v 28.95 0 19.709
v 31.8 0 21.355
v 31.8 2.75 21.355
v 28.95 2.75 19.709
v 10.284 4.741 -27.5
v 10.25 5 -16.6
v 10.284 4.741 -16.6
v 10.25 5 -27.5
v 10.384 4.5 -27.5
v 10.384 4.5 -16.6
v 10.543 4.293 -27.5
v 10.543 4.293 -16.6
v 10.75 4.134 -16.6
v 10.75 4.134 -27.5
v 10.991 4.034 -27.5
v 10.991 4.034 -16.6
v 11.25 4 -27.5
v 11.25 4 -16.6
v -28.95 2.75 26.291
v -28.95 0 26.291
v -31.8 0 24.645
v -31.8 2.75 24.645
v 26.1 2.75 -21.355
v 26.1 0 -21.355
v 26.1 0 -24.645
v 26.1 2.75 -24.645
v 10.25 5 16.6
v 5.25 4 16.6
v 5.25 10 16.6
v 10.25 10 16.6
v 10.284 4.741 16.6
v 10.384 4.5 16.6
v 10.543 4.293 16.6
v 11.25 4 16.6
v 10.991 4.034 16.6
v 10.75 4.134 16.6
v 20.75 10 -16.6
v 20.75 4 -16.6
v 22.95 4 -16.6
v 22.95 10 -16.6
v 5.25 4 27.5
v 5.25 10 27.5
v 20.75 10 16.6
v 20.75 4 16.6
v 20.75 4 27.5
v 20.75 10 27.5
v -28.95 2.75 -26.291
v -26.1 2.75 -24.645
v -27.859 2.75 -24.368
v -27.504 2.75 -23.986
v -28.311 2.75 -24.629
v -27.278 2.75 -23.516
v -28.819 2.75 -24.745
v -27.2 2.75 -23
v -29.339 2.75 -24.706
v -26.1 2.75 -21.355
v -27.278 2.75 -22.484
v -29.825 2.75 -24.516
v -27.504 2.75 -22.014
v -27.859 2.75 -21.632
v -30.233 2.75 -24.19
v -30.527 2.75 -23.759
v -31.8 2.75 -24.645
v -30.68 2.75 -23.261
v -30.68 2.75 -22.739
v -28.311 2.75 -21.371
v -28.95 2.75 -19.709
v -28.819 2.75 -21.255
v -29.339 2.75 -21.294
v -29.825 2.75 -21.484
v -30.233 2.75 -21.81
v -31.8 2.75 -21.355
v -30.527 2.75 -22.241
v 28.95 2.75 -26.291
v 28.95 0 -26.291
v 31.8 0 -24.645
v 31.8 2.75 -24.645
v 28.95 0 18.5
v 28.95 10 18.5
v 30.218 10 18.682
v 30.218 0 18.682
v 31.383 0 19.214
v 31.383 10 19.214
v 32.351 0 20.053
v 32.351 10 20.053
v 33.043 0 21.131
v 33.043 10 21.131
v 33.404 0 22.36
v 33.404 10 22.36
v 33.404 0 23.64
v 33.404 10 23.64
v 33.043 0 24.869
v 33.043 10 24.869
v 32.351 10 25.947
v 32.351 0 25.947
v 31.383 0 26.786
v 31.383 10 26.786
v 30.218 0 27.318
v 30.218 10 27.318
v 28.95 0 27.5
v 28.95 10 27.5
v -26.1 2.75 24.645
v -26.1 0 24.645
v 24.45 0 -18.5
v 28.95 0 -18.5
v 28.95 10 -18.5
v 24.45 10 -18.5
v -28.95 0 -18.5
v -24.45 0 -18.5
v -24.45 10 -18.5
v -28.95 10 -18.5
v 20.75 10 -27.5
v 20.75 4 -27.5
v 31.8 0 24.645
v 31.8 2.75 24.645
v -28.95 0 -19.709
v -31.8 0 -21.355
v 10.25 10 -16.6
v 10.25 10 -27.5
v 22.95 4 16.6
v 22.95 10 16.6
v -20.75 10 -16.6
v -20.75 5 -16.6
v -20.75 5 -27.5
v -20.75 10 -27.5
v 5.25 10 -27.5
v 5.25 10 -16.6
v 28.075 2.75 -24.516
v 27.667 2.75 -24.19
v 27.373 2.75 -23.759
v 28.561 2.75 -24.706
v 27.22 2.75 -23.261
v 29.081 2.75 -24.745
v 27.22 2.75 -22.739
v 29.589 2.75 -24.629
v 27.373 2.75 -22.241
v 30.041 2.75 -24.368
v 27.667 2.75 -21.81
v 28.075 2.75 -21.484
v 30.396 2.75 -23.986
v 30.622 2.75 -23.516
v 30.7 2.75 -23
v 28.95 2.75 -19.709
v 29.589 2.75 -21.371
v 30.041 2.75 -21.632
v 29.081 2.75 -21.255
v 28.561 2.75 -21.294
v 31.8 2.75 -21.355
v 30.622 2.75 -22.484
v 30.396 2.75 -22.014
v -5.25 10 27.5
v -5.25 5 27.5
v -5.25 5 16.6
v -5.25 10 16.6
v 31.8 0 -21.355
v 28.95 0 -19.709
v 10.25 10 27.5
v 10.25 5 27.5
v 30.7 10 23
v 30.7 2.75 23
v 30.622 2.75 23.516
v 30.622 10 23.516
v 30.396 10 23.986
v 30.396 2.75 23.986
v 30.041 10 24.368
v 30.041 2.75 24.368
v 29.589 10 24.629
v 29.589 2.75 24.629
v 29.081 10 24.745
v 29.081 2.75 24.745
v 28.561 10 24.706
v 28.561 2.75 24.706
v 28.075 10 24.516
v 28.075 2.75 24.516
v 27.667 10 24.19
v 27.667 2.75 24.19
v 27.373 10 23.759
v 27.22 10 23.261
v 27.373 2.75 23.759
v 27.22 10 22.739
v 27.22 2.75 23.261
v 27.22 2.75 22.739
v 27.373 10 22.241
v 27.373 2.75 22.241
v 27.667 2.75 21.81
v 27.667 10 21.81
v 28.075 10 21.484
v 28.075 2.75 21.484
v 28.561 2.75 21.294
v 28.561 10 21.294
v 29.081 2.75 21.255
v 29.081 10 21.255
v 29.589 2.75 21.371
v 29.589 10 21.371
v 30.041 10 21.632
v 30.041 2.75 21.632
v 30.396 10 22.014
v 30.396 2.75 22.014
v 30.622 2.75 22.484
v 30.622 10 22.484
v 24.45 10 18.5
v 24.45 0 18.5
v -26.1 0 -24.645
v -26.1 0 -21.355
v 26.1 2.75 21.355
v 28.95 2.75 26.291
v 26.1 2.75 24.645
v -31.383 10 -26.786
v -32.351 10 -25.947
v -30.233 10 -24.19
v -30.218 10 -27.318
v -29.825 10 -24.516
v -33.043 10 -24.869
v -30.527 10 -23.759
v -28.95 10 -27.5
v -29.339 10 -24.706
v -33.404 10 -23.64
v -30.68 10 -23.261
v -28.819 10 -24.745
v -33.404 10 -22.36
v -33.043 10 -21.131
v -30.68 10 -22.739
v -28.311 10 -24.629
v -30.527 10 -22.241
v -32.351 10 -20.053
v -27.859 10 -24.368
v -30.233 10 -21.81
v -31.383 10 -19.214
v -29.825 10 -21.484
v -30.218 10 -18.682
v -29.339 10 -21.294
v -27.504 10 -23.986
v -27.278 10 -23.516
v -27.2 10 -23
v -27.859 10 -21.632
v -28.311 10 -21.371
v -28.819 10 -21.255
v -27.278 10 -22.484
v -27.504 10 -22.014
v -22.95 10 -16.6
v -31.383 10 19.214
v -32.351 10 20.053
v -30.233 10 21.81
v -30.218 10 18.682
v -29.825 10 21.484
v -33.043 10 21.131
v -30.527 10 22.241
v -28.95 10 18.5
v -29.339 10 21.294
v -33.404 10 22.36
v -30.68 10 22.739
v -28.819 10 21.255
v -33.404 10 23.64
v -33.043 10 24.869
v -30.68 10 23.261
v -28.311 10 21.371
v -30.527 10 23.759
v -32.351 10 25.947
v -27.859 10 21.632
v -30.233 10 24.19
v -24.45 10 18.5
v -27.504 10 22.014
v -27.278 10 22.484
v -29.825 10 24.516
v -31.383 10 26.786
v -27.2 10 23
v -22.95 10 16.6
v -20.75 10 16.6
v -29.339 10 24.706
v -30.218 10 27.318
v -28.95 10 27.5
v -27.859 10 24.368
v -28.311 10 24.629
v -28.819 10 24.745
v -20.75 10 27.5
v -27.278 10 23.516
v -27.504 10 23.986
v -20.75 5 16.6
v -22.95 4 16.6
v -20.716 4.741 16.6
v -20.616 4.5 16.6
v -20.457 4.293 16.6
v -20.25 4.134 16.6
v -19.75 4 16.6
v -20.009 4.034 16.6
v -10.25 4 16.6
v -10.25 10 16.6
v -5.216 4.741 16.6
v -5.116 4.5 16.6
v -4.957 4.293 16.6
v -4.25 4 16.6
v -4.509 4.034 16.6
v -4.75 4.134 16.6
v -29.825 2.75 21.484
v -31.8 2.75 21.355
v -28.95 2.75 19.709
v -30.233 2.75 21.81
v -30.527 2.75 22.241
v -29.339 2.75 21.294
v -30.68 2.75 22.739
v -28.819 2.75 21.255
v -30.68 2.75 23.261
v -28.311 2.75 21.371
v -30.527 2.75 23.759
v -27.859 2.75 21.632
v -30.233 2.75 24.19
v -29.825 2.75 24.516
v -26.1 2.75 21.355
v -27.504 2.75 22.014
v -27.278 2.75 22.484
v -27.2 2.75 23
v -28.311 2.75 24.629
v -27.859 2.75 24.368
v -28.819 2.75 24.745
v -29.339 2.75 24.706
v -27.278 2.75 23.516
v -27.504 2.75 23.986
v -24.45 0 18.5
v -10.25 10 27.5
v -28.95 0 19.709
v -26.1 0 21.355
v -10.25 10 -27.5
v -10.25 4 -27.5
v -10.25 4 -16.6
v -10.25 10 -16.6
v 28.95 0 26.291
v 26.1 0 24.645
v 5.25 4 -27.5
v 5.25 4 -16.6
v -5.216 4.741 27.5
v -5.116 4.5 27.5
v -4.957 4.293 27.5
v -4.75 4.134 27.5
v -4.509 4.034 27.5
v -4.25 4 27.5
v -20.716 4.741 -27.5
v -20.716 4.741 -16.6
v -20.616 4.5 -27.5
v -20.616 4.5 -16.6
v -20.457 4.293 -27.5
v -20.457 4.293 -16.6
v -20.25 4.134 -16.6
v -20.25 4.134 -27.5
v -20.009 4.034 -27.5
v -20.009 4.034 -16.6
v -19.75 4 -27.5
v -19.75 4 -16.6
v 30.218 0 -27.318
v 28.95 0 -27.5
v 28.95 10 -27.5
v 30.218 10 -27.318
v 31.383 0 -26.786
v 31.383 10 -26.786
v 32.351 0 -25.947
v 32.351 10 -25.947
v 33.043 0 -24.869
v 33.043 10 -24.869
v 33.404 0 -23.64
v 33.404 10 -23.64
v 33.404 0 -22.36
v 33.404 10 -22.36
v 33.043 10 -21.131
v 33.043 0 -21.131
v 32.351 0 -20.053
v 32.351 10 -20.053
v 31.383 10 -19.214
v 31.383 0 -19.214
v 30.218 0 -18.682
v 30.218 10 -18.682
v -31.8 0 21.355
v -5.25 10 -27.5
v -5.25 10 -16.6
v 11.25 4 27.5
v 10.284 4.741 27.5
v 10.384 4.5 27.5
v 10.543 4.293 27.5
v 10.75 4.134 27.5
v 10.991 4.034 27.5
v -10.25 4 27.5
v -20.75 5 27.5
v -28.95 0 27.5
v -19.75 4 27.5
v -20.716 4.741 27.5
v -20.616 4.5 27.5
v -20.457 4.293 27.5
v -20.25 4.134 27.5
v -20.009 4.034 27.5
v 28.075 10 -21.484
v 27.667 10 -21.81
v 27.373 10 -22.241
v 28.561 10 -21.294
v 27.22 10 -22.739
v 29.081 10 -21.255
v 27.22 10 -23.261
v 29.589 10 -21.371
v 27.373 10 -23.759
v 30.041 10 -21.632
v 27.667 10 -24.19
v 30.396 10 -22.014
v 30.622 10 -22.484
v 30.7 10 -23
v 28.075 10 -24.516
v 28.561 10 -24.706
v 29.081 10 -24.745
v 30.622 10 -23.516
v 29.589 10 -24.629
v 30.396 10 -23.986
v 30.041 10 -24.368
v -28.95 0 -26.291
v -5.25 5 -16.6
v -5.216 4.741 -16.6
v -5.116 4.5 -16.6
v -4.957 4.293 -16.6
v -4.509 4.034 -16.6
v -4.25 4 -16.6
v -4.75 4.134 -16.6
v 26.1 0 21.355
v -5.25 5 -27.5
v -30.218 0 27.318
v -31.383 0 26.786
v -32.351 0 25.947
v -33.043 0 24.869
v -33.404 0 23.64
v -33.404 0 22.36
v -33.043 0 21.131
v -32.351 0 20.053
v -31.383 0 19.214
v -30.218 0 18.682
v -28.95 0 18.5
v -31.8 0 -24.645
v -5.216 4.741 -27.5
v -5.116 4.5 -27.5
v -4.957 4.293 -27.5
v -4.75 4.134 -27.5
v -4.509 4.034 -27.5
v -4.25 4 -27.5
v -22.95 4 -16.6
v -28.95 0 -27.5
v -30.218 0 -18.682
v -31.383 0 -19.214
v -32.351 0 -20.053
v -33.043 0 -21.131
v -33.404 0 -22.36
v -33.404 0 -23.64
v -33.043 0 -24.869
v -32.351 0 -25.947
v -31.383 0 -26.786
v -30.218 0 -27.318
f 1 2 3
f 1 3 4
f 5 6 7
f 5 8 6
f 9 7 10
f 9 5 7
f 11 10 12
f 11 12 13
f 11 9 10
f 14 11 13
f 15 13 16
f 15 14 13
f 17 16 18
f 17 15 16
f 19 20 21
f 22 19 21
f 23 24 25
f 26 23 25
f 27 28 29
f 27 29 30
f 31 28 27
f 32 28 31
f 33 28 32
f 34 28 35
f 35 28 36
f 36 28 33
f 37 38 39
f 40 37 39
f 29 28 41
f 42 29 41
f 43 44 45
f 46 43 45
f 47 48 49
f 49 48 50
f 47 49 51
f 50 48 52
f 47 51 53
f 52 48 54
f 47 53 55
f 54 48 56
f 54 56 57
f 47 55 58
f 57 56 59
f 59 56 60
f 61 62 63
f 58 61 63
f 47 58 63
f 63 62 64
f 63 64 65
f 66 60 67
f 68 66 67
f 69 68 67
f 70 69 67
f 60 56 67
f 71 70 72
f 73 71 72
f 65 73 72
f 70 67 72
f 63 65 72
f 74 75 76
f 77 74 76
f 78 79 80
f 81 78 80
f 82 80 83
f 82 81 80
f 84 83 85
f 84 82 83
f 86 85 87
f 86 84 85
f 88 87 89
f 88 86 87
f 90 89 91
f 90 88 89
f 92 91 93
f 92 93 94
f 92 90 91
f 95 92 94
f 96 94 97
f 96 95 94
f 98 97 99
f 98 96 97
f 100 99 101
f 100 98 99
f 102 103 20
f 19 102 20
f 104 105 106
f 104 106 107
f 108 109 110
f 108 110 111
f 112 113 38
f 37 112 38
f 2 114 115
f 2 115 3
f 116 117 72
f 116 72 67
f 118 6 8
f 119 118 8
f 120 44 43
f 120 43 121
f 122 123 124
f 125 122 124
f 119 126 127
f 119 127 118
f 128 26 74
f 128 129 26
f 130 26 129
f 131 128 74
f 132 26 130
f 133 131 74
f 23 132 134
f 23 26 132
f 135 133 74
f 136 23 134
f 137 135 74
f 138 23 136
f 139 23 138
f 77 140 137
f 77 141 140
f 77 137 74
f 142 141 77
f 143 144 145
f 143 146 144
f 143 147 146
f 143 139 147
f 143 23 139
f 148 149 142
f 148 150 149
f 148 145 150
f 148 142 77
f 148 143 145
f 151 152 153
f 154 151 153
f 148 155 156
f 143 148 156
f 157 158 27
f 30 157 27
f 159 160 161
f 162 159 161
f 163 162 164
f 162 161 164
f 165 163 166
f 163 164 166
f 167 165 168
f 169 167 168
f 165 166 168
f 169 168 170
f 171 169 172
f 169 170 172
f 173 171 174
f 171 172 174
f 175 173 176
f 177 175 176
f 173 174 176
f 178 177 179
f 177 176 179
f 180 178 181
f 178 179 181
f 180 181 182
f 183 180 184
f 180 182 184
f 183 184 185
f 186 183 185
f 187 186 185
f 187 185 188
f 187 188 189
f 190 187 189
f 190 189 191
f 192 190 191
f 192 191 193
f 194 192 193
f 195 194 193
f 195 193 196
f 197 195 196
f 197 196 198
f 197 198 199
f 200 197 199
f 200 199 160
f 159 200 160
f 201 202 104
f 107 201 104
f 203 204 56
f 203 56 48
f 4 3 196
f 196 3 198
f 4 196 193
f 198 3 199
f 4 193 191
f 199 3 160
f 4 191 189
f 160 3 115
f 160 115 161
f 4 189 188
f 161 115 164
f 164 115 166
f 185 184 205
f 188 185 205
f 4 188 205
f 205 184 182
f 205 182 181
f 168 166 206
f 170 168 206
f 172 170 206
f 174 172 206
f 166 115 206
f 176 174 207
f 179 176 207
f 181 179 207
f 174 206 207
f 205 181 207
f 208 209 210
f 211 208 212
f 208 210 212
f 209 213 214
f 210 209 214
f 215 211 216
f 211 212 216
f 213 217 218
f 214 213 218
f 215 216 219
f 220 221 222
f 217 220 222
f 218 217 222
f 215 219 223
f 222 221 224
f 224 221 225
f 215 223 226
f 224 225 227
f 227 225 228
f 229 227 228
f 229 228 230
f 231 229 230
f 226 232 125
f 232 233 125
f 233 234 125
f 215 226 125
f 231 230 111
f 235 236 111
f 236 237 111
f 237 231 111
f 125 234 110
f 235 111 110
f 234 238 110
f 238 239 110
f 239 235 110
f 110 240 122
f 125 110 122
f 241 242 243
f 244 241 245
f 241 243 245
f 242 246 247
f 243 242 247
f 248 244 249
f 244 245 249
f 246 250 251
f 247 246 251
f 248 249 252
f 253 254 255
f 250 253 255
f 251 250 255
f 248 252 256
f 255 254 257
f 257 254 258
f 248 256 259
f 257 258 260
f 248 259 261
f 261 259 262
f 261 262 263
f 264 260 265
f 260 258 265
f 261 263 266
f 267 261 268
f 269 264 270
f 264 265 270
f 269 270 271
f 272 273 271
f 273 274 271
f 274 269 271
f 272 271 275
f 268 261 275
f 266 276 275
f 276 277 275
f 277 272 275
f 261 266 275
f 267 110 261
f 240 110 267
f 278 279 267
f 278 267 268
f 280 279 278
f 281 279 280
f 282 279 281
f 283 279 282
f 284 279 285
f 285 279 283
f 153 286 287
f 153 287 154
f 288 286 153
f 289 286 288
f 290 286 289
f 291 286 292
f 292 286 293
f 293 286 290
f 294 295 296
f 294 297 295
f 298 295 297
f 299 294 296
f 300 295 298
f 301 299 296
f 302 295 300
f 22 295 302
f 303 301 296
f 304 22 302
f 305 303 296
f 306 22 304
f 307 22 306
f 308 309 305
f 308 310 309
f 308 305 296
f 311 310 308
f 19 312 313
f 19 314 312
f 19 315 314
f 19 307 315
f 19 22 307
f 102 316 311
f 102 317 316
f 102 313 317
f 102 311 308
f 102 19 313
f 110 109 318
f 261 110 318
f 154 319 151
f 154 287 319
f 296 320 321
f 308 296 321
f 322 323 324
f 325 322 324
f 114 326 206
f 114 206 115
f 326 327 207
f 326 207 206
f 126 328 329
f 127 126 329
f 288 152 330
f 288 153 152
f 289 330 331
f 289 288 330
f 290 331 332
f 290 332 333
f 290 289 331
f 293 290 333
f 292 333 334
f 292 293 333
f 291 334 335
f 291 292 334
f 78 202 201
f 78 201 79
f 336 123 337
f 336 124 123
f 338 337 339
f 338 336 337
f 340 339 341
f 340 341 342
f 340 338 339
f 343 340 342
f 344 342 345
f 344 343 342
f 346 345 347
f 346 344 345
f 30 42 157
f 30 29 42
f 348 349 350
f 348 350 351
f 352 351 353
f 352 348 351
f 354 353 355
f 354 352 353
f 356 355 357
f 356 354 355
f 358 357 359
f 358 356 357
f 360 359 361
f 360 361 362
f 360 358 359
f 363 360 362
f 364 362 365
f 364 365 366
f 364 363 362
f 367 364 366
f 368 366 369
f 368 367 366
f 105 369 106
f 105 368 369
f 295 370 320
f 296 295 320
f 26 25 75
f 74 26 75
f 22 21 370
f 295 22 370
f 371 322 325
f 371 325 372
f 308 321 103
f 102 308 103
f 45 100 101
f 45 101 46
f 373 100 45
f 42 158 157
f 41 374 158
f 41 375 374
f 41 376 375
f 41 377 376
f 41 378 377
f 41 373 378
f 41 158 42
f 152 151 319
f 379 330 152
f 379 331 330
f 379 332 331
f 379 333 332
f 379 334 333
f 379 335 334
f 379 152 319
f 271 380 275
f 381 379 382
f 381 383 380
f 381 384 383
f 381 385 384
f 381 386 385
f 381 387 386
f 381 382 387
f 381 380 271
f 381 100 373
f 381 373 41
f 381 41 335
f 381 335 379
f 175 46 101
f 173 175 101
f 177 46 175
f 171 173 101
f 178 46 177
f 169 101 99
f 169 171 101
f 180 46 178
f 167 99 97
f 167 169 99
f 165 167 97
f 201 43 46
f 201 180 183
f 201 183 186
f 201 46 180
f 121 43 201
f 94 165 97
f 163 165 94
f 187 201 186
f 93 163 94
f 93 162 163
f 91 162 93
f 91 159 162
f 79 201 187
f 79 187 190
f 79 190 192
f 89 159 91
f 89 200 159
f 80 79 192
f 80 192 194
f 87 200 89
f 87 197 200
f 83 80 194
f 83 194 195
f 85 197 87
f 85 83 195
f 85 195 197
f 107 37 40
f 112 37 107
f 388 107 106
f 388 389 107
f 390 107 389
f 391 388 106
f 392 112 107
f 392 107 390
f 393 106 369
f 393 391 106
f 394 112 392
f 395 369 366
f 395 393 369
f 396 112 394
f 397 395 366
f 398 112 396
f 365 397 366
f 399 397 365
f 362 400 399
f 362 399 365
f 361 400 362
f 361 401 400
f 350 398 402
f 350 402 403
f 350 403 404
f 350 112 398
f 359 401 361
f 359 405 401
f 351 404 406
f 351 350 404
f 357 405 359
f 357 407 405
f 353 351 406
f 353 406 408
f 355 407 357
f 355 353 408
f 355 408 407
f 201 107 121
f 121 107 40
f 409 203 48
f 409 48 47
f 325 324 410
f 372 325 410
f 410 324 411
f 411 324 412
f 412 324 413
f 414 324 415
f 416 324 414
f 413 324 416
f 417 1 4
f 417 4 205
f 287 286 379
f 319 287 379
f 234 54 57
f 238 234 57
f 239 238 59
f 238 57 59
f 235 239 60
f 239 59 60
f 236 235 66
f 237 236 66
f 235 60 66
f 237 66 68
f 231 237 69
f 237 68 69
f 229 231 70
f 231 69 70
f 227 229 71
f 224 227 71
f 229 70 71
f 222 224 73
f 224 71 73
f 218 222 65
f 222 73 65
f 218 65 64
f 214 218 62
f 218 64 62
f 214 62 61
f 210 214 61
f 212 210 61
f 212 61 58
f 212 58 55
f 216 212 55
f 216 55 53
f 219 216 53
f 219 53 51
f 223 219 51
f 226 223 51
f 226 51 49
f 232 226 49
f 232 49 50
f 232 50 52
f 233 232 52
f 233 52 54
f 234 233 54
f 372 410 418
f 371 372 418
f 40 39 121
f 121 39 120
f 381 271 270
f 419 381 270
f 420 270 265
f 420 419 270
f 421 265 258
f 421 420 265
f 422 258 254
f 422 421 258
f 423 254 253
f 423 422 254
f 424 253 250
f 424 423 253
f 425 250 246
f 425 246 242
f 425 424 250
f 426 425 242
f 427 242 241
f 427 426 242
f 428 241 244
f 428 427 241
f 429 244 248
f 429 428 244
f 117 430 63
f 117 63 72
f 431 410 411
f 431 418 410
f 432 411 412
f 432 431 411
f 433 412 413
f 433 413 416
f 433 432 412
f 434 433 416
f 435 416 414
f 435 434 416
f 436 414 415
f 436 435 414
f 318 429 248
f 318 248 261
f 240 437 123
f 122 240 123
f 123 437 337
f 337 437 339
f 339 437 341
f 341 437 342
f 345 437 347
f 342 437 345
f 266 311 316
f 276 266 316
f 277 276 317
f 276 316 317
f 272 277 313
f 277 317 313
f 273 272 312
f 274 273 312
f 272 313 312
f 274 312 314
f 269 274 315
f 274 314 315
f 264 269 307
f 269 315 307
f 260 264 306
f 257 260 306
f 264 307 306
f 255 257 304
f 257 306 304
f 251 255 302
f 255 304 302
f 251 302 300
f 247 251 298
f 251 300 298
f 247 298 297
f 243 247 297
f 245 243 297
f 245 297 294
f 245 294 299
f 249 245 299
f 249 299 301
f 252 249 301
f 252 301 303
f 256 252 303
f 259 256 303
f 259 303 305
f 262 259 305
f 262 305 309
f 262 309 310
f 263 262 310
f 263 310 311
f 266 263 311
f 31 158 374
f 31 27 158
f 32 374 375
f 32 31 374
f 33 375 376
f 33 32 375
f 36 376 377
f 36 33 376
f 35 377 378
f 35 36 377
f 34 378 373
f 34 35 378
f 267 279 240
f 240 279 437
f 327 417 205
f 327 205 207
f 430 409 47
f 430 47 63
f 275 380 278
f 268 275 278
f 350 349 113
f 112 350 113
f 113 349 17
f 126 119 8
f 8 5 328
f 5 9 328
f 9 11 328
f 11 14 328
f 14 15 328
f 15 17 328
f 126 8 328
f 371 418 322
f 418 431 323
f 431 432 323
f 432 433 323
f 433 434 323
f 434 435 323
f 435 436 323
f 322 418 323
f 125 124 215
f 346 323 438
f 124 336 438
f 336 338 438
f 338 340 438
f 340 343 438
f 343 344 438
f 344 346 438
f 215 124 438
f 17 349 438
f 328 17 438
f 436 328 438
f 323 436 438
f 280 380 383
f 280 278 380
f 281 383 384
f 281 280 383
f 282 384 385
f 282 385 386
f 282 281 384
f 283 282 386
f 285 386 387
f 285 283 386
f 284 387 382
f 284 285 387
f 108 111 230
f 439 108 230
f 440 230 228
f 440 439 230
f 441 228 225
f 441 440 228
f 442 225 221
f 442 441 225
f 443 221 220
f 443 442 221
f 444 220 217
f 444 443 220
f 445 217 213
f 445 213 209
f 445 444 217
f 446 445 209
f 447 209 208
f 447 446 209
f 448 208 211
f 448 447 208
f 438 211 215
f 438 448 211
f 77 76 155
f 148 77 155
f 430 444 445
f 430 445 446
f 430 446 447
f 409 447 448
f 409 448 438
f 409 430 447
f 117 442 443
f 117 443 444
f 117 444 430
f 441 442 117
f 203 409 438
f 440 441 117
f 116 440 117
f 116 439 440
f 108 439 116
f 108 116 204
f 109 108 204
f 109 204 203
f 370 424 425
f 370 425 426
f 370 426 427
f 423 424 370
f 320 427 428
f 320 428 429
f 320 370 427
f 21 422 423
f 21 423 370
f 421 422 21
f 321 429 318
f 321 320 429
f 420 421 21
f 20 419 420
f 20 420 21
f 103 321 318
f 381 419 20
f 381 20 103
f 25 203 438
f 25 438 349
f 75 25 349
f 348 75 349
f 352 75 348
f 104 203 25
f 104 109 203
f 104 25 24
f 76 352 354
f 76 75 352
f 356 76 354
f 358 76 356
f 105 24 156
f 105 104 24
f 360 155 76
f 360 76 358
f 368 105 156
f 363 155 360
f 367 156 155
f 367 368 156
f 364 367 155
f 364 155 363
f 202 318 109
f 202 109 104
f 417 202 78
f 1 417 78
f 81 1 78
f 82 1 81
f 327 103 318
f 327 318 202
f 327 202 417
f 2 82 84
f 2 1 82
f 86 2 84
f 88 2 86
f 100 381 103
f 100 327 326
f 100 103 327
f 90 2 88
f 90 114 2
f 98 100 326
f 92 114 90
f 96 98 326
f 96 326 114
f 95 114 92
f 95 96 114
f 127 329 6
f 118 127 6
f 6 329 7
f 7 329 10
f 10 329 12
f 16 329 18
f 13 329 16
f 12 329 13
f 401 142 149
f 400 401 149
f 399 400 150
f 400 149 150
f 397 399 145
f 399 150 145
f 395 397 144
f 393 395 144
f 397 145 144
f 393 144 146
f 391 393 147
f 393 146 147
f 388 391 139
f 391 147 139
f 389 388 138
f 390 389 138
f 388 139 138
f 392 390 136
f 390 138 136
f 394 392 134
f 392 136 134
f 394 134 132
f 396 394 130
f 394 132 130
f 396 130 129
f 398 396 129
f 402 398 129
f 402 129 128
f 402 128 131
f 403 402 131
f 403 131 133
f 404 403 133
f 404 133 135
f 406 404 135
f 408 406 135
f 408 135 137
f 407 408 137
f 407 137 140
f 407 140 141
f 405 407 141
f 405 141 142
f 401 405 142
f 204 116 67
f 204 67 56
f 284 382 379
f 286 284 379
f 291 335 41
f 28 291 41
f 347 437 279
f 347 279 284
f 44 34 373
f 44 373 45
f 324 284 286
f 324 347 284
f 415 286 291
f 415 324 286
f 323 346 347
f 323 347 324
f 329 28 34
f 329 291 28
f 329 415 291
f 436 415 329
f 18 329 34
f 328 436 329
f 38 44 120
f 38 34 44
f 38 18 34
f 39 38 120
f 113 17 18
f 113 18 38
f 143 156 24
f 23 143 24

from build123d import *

# Parameters (mm, degrees)
SKETCH1_W           = 48.9
SKETCH1_H           = 55
SKETCH1_W_2         = 45.9
SKETCH1_H_2         = 9.4
SKETCH1_H_3         = 33.2
BOSS_EXTRUDE1_DEPTH = 4
SKETCH2_W           = 1.5
SKETCH2_H           = 33.2
SKETCH2_W_2         = 5
SKETCH2_H_2         = 1.5
SKETCH2_H_3         = 9.4
SKETCH2_W_3         = 2.2
BOSS_EXTRUDE2_DEPTH = 6
SKETCH4_R           = 4.5
SKETCH4_R_2         = 1.75
BOSS_EXTRUDE3_DEPTH = 10
FILLET1_R           = 1
CUT_EXTRUDE1_DEPTH  = 2.75


with BuildPart() as part:
    # Sketch1 → Boss-Extrude1 (new body)
    with BuildSketch(Plane(origin=(0, 0, 0), x_dir=(1, 0, 0), z_dir=(0, 1, 0))):
        Rectangle(SKETCH1_W, SKETCH1_H)
        Polygon((22.95, 26), (22.95, 16.6), (22.95, -16.6), (22.95, -26), (-22.95, -26), (-22.95, -16.6), (-22.95, 16.6), (-22.95, 26), align=None, mode=Mode.SUBTRACT)
        with Locations((0, 21.3)):
            Rectangle(SKETCH1_W_2, SKETCH1_H_2)
        Rectangle(SKETCH1_W_2, SKETCH1_H_3)
        with Locations((0, -21.3)):
            Rectangle(SKETCH1_W_2, SKETCH1_H_2)
    extrude(amount=BOSS_EXTRUDE1_DEPTH)

    # Sketch2 → Boss-Extrude2 (add)
    with BuildSketch(Plane(origin=(0, 4, 0), x_dir=(1, 0, 0), z_dir=(0, 1, 0))):
        Polygon((-24.45, 16.6), (-22.95, 16.6), (-22.95, 26), (-20.75, 26), (-20.75, 27.5), (-24.45, 27.5), align=None)
        with Locations((-23.7, 0)):
            Rectangle(SKETCH2_W, SKETCH2_H)
        Polygon((-22.95, -26), (-22.95, -16.6), (-24.45, -16.6), (-24.45, -27.5), (-20.75, -27.5), (-20.75, -26), align=None)
        with Locations((-7.75, -26.75)):
            Rectangle(SKETCH2_W_2, SKETCH2_H_2)
        with Locations((7.75, -26.75)):
            Rectangle(SKETCH2_W_2, SKETCH2_H_2)
        Polygon((24.45, -16.6), (22.95, -16.6), (22.95, -26), (20.75, -26), (20.75, -27.5), (24.45, -27.5), align=None)
        with Locations((23.7, 0)):
            Rectangle(SKETCH2_W, SKETCH2_H)
        Polygon((22.95, 26), (22.95, 16.6), (24.45, 16.6), (24.45, 27.5), (20.75, 27.5), (20.75, 26), align=None)
        with Locations((7.75, 26.75)):
            Rectangle(SKETCH2_W_2, SKETCH2_H_2)
        with Locations((-7.75, 26.75)):
            Rectangle(SKETCH2_W_2, SKETCH2_H_2)
        with Locations((-7.75, 21.3)):
            Rectangle(SKETCH2_W_2, SKETCH2_H_3)
        with Locations((7.75, 21.3)):
            Rectangle(SKETCH2_W_2, SKETCH2_H_3)
        with Locations((7.75, -21.3)):
            Rectangle(SKETCH2_W_2, SKETCH2_H_3)
        with Locations((-7.75, -21.3)):
            Rectangle(SKETCH2_W_2, SKETCH2_H_3)
        with Locations((-21.85, 21.3)):
            Rectangle(SKETCH2_W_3, SKETCH2_H_3)
        with Locations((21.85, 21.3)):
            Rectangle(SKETCH2_W_3, SKETCH2_H_3)
        with Locations((21.85, -21.3)):
            Rectangle(SKETCH2_W_3, SKETCH2_H_3)
        with Locations((-21.85, -21.3)):
            Rectangle(SKETCH2_W_3, SKETCH2_H_3)
    extrude(amount=BOSS_EXTRUDE2_DEPTH)

    # Sketch4 → Boss-Extrude3 (add)
    with BuildSketch(Plane.XZ):
        with BuildLine():
            Line((-24.45, 27.5), (-28.95, 27.5))
            ThreePointArc((-28.95, 27.5), (-25.768019485, 26.181980515), (-24.45, 23))
            Line((-24.45, 23), (-24.45, 27.5))
        make_face()
        with BuildLine():
            Line((-24.45, 18.5), (-24.45, 23))
            ThreePointArc((-24.45, 23), (-25.768019485, 19.818019485), (-28.95, 18.5))
            Line((-28.95, 18.5), (-24.45, 18.5))
        make_face()
        with Locations((-28.95, 23)):
            Circle(SKETCH4_R)
        with Locations((-28.95, 23)):
            Circle(SKETCH4_R_2, mode=Mode.SUBTRACT)
        with BuildLine():
            ThreePointArc((24.45, 22.999999999), (25.768019484, 26.181980515), (28.95, 27.5))
            Line((28.95, 27.5), (24.45, 27.5))
            Line((24.45, 27.5), (24.45, 22.999999999))
        make_face()
        with Locations((28.95, 23)):
            Circle(SKETCH4_R)
        with Locations((28.95, 23)):
            Circle(SKETCH4_R_2, mode=Mode.SUBTRACT)
        with BuildLine():
            ThreePointArc((28.95, 18.5), (25.768019485, 19.818019484), (24.45, 22.999999999))
            Line((24.45, 22.999999999), (24.45, 18.5))
            Line((24.45, 18.5), (28.95, 18.5))
        make_face()
        with Locations((28.95, -23)):
            Circle(SKETCH4_R)
        with Locations((28.95, -23)):
            Circle(SKETCH4_R_2, mode=Mode.SUBTRACT)
        with BuildLine():
            ThreePointArc((28.95, -27.5), (25.768019485, -26.181980515), (24.45, -23))
            Line((24.45, -23), (24.45, -27.5))
            Line((24.45, -27.5), (28.95, -27.5))
        make_face()
        with BuildLine():
            Line((28.95, -18.5), (24.45, -18.5))
            Line((24.45, -18.5), (24.45, -23))
            ThreePointArc((24.45, -23), (25.768019485, -19.818019485), (28.95, -18.5))
        make_face()
        with BuildLine():
            Line((-24.45, -27.5), (-24.45, -23))
            ThreePointArc((-24.45, -23), (-25.768019485, -26.181980515), (-28.95, -27.5))
            Line((-28.95, -27.5), (-24.45, -27.5))
        make_face()
        with BuildLine():
            Line((-24.45, -23), (-24.45, -18.5))
            Line((-24.45, -18.5), (-28.95, -18.5))
            ThreePointArc((-28.95, -18.5), (-25.768019485, -19.818019485), (-24.45, -23))
        make_face()
        with Locations((-28.95, -23)):
            Circle(SKETCH4_R)
        with Locations((-28.95, -23)):
            Circle(SKETCH4_R_2, mode=Mode.SUBTRACT)
    extrude(amount=-BOSS_EXTRUDE3_DEPTH)

    # Fillet1
    fillet1_edges = [part.edges().sort_by_distance(p)[0] for p in [
        (-5.25, 4, -22.05),
        (10.25, 4, -22.05),
        (10.25, 4, 22.05),
        (-5.25, 4, 22.05),
        (-20.75, 4, -22.05),
        (-20.75, 4, 22.05),
    ]]
    fillet(fillet1_edges, radius=FILLET1_R)

    # Sketch5 → Cut-Extrude1 (cut)
    with BuildSketch(Plane.XZ):
        Polygon((-28.95, 19.709103466), (-26.1, 21.354551733), (-26.1, 24.645448267), (-28.95, 26.290896534), (-31.8, 24.645448267), (-31.8, 21.354551733), align=None)
        Polygon((31.8, 21.354551733), (28.95, 19.709103466), (26.1, 21.354551733), (26.1, 24.645448267), (28.95, 26.290896534), (31.8, 24.645448267), align=None)
        Polygon((31.8, -21.354551733), (28.95, -19.709103466), (26.1, -21.354551733), (26.1, -24.645448267), (28.95, -26.290896534), (31.8, -24.645448267), align=None)
        Polygon((-31.8, -21.354551733), (-28.95, -19.709103466), (-26.1, -21.354551733), (-26.1, -24.645448267), (-28.95, -26.290896534), (-31.8, -24.645448267), align=None)
    extrude(amount=-CUT_EXTRUDE1_DEPTH, mode=Mode.SUBTRACT)


solid = part.part
